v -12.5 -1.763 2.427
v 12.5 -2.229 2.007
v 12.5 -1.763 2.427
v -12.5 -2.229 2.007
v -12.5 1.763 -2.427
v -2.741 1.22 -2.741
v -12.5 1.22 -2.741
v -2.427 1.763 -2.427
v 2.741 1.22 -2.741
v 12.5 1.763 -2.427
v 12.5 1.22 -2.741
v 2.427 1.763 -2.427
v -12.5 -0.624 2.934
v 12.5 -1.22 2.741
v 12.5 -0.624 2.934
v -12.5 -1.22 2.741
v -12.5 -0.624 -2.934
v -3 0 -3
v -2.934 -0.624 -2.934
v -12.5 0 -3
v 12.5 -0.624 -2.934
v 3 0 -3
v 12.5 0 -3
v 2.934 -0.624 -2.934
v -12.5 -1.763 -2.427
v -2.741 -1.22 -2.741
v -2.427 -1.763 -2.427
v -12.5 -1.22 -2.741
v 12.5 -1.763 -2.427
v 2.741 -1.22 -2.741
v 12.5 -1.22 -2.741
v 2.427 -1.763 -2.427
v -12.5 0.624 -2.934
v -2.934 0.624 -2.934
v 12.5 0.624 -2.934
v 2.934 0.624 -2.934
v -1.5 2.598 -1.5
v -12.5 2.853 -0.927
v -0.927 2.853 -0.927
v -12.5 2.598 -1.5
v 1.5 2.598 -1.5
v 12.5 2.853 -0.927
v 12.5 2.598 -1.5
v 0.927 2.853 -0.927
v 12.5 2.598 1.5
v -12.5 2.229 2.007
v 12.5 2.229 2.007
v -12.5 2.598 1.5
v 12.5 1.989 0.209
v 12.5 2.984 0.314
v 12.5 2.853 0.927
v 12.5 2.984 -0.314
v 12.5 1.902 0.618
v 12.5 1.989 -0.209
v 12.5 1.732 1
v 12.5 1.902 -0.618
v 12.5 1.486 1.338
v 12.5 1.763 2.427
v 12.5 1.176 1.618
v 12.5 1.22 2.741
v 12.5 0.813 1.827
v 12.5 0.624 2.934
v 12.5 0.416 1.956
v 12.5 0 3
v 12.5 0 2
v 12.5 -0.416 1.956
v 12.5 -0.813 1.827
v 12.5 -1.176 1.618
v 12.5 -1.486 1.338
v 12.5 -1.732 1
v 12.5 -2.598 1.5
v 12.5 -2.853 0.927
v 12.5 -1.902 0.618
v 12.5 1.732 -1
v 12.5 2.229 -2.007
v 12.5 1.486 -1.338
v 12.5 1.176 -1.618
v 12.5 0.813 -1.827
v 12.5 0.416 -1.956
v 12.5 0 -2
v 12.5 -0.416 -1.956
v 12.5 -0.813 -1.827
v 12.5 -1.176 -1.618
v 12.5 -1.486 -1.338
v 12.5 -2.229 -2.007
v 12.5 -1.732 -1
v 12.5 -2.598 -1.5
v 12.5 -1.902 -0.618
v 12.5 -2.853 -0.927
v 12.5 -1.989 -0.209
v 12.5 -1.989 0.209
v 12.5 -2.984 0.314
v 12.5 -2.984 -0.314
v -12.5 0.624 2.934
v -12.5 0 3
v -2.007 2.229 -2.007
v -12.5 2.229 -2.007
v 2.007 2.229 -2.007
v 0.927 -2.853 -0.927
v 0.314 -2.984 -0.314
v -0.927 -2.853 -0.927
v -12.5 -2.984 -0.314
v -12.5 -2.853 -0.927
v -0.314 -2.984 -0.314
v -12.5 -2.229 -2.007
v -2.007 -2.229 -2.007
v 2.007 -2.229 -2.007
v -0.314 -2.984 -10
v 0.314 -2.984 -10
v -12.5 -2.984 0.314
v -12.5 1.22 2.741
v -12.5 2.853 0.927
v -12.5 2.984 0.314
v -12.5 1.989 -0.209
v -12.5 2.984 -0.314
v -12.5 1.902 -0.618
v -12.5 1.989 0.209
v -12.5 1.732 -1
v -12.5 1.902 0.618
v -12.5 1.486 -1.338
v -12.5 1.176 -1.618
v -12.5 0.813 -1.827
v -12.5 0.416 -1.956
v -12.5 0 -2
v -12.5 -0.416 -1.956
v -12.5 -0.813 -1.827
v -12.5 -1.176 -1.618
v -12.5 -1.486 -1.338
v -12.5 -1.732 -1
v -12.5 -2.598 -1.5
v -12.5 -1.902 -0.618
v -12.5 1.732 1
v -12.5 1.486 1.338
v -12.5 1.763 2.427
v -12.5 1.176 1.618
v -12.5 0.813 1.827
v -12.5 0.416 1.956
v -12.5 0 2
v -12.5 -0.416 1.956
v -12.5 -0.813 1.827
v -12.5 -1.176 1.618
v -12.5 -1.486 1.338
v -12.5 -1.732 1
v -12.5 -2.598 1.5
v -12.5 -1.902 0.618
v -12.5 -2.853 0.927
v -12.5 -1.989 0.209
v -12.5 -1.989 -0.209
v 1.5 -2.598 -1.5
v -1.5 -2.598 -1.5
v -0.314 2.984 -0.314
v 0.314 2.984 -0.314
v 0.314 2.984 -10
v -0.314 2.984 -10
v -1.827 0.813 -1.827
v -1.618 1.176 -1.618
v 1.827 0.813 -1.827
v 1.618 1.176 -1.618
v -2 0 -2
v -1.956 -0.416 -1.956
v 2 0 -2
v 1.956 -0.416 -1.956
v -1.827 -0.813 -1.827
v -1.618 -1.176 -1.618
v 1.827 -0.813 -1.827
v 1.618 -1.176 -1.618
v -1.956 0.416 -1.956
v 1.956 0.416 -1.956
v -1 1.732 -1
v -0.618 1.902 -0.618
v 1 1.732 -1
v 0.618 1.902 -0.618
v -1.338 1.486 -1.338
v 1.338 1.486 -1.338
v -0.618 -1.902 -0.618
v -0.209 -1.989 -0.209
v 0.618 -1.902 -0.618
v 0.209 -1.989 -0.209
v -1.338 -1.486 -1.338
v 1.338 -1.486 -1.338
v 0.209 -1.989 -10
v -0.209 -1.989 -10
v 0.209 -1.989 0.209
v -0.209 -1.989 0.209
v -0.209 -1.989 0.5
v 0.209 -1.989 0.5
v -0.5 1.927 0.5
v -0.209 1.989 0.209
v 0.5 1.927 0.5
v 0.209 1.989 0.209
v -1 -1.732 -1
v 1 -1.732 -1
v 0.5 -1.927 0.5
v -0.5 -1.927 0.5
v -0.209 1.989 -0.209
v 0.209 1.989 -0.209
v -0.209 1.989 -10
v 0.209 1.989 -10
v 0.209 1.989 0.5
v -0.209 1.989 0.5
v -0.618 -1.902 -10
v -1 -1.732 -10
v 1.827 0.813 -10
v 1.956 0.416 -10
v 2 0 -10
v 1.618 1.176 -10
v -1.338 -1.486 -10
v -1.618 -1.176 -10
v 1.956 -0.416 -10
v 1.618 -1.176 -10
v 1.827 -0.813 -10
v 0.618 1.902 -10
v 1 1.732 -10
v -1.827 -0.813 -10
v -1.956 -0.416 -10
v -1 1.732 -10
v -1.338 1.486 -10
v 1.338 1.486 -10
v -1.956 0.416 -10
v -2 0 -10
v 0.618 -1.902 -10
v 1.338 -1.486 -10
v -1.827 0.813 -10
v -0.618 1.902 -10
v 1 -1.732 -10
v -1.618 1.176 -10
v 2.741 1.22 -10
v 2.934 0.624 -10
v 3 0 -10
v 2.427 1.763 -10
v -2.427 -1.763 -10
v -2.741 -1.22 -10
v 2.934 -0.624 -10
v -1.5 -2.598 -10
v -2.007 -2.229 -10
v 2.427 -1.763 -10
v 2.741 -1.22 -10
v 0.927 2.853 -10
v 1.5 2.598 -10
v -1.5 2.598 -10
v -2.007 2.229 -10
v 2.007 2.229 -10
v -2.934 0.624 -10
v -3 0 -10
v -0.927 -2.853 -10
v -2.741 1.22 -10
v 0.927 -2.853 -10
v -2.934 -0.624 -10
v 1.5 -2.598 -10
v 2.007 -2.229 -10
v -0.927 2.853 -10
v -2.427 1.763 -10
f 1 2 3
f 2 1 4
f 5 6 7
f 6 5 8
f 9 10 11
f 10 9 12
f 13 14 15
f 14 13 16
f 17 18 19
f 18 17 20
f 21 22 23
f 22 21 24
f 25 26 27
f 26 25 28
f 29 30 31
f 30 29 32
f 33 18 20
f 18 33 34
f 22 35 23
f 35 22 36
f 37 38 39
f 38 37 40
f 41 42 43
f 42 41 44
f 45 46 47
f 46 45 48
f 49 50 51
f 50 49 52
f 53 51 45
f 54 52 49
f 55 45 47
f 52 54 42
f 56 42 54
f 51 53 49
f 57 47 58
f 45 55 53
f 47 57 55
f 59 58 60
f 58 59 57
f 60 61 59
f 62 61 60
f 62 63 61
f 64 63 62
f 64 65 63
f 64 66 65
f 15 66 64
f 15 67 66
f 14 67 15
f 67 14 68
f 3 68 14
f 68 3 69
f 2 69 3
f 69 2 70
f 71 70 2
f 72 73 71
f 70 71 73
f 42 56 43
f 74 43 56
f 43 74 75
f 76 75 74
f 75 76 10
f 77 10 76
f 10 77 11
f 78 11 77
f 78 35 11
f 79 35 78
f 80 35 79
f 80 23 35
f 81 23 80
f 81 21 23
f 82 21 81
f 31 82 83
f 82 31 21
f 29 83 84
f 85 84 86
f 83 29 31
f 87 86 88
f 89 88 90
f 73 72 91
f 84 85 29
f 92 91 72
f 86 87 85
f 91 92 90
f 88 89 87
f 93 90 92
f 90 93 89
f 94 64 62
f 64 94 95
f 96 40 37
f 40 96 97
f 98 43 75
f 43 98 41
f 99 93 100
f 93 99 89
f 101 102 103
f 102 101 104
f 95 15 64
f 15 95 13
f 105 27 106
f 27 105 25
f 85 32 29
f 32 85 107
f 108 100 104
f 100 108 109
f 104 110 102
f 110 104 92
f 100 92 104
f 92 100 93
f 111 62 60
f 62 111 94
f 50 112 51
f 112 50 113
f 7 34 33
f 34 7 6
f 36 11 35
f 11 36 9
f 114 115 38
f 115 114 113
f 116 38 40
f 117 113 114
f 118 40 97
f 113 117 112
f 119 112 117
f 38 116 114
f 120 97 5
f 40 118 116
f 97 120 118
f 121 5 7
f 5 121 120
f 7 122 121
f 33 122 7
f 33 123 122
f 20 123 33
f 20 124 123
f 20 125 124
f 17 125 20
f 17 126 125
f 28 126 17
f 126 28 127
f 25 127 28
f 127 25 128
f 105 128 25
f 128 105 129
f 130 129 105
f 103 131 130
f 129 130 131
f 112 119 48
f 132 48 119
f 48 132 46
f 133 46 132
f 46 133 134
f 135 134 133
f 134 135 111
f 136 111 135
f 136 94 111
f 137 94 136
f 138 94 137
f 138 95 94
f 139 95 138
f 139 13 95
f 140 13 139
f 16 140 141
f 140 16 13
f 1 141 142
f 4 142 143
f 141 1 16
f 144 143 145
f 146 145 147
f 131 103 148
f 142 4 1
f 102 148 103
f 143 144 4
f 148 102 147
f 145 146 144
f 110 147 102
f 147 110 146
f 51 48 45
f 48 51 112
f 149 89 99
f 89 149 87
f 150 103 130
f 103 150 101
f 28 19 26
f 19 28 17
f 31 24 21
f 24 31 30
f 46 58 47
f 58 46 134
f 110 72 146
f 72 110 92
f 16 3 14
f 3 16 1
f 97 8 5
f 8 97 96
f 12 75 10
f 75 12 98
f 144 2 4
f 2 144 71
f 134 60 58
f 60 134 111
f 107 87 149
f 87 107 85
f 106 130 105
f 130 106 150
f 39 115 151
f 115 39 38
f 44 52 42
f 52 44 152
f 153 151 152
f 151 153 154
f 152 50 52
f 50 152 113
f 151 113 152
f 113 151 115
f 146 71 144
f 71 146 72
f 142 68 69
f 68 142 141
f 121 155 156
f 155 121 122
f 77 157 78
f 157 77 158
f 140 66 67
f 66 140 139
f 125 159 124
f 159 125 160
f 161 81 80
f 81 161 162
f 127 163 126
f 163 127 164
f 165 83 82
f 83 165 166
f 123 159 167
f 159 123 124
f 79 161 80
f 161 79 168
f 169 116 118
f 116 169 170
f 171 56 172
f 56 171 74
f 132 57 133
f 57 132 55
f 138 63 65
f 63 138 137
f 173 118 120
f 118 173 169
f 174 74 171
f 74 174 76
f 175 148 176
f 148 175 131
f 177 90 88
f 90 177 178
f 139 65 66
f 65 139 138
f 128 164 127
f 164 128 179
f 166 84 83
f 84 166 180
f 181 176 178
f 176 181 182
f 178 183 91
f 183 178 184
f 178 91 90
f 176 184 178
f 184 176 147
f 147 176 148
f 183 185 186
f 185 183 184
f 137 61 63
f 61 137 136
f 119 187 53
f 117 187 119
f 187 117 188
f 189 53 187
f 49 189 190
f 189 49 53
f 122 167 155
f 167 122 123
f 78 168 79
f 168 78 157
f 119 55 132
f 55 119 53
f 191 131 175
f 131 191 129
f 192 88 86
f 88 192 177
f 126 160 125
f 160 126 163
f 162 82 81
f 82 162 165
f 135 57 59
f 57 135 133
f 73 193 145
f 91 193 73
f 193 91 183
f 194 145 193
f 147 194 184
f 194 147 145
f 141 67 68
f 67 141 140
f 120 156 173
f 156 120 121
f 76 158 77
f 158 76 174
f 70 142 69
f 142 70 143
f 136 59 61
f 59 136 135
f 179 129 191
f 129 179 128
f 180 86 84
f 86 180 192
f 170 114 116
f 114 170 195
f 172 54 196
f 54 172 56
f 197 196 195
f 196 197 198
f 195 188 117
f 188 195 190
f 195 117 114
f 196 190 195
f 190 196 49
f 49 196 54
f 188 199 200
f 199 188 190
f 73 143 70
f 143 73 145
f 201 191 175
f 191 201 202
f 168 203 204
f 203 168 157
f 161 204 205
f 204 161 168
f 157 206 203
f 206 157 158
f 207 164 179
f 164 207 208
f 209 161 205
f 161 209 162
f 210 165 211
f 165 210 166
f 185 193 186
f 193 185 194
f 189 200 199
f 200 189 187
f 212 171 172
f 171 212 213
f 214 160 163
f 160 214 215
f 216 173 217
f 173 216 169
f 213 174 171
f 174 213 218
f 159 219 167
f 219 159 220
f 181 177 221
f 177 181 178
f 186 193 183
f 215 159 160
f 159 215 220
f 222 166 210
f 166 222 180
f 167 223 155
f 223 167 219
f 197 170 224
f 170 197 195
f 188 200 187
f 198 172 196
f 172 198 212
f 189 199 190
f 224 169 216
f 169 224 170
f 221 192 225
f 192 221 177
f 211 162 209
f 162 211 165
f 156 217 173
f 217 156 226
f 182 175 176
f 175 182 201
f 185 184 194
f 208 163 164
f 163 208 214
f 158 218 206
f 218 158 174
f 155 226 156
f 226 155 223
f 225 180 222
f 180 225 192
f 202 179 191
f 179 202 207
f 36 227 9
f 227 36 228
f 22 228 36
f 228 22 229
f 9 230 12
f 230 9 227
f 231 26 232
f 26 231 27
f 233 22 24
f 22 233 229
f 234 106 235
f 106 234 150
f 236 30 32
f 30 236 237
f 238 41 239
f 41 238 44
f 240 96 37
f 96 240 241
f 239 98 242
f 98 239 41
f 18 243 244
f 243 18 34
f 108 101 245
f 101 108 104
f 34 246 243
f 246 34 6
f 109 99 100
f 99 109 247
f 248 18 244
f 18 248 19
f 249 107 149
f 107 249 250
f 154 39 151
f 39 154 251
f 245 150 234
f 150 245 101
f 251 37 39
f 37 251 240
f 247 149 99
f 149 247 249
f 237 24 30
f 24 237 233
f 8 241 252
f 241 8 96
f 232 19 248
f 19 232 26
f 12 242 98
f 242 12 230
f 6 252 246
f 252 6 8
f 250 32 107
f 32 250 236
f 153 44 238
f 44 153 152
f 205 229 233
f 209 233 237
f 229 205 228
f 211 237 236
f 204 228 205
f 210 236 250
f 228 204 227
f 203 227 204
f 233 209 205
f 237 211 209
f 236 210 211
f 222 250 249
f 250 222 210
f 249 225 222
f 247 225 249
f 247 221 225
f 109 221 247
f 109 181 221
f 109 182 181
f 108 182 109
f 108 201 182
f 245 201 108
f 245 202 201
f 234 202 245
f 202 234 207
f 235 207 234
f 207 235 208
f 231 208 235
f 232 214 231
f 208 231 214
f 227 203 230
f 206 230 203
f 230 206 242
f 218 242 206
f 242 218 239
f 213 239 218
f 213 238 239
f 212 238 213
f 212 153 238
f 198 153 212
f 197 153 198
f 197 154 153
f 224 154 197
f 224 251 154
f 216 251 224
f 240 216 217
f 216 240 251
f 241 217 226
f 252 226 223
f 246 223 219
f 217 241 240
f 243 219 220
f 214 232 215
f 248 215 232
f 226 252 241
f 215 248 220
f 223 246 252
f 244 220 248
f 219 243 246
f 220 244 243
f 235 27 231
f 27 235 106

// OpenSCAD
difference(){
  rotate([0, 90, 0]){
    cylinder(h=25, r=3, center=true, $fn=30);
  }
  rotate([0, 90, 0]){
    cylinder(h=26, r=2, center=true, $fn=30);
  }
  translate([0, 0, -7.5]){
    cylinder(h=16, r=2, center=true, $fn=30);
  }
}
difference(){
  translate([0, 0, -5]){
    cylinder(h=10, r=3, center=true, $fn=30);
  }
  translate([0, 0, -5]){
    cylinder(h=11, r=2, center=true, $fn=30);
  }
  rotate([0, 90, 0]){
    cylinder(h=31, r=2, center=true, $fn=30);
  }
}
